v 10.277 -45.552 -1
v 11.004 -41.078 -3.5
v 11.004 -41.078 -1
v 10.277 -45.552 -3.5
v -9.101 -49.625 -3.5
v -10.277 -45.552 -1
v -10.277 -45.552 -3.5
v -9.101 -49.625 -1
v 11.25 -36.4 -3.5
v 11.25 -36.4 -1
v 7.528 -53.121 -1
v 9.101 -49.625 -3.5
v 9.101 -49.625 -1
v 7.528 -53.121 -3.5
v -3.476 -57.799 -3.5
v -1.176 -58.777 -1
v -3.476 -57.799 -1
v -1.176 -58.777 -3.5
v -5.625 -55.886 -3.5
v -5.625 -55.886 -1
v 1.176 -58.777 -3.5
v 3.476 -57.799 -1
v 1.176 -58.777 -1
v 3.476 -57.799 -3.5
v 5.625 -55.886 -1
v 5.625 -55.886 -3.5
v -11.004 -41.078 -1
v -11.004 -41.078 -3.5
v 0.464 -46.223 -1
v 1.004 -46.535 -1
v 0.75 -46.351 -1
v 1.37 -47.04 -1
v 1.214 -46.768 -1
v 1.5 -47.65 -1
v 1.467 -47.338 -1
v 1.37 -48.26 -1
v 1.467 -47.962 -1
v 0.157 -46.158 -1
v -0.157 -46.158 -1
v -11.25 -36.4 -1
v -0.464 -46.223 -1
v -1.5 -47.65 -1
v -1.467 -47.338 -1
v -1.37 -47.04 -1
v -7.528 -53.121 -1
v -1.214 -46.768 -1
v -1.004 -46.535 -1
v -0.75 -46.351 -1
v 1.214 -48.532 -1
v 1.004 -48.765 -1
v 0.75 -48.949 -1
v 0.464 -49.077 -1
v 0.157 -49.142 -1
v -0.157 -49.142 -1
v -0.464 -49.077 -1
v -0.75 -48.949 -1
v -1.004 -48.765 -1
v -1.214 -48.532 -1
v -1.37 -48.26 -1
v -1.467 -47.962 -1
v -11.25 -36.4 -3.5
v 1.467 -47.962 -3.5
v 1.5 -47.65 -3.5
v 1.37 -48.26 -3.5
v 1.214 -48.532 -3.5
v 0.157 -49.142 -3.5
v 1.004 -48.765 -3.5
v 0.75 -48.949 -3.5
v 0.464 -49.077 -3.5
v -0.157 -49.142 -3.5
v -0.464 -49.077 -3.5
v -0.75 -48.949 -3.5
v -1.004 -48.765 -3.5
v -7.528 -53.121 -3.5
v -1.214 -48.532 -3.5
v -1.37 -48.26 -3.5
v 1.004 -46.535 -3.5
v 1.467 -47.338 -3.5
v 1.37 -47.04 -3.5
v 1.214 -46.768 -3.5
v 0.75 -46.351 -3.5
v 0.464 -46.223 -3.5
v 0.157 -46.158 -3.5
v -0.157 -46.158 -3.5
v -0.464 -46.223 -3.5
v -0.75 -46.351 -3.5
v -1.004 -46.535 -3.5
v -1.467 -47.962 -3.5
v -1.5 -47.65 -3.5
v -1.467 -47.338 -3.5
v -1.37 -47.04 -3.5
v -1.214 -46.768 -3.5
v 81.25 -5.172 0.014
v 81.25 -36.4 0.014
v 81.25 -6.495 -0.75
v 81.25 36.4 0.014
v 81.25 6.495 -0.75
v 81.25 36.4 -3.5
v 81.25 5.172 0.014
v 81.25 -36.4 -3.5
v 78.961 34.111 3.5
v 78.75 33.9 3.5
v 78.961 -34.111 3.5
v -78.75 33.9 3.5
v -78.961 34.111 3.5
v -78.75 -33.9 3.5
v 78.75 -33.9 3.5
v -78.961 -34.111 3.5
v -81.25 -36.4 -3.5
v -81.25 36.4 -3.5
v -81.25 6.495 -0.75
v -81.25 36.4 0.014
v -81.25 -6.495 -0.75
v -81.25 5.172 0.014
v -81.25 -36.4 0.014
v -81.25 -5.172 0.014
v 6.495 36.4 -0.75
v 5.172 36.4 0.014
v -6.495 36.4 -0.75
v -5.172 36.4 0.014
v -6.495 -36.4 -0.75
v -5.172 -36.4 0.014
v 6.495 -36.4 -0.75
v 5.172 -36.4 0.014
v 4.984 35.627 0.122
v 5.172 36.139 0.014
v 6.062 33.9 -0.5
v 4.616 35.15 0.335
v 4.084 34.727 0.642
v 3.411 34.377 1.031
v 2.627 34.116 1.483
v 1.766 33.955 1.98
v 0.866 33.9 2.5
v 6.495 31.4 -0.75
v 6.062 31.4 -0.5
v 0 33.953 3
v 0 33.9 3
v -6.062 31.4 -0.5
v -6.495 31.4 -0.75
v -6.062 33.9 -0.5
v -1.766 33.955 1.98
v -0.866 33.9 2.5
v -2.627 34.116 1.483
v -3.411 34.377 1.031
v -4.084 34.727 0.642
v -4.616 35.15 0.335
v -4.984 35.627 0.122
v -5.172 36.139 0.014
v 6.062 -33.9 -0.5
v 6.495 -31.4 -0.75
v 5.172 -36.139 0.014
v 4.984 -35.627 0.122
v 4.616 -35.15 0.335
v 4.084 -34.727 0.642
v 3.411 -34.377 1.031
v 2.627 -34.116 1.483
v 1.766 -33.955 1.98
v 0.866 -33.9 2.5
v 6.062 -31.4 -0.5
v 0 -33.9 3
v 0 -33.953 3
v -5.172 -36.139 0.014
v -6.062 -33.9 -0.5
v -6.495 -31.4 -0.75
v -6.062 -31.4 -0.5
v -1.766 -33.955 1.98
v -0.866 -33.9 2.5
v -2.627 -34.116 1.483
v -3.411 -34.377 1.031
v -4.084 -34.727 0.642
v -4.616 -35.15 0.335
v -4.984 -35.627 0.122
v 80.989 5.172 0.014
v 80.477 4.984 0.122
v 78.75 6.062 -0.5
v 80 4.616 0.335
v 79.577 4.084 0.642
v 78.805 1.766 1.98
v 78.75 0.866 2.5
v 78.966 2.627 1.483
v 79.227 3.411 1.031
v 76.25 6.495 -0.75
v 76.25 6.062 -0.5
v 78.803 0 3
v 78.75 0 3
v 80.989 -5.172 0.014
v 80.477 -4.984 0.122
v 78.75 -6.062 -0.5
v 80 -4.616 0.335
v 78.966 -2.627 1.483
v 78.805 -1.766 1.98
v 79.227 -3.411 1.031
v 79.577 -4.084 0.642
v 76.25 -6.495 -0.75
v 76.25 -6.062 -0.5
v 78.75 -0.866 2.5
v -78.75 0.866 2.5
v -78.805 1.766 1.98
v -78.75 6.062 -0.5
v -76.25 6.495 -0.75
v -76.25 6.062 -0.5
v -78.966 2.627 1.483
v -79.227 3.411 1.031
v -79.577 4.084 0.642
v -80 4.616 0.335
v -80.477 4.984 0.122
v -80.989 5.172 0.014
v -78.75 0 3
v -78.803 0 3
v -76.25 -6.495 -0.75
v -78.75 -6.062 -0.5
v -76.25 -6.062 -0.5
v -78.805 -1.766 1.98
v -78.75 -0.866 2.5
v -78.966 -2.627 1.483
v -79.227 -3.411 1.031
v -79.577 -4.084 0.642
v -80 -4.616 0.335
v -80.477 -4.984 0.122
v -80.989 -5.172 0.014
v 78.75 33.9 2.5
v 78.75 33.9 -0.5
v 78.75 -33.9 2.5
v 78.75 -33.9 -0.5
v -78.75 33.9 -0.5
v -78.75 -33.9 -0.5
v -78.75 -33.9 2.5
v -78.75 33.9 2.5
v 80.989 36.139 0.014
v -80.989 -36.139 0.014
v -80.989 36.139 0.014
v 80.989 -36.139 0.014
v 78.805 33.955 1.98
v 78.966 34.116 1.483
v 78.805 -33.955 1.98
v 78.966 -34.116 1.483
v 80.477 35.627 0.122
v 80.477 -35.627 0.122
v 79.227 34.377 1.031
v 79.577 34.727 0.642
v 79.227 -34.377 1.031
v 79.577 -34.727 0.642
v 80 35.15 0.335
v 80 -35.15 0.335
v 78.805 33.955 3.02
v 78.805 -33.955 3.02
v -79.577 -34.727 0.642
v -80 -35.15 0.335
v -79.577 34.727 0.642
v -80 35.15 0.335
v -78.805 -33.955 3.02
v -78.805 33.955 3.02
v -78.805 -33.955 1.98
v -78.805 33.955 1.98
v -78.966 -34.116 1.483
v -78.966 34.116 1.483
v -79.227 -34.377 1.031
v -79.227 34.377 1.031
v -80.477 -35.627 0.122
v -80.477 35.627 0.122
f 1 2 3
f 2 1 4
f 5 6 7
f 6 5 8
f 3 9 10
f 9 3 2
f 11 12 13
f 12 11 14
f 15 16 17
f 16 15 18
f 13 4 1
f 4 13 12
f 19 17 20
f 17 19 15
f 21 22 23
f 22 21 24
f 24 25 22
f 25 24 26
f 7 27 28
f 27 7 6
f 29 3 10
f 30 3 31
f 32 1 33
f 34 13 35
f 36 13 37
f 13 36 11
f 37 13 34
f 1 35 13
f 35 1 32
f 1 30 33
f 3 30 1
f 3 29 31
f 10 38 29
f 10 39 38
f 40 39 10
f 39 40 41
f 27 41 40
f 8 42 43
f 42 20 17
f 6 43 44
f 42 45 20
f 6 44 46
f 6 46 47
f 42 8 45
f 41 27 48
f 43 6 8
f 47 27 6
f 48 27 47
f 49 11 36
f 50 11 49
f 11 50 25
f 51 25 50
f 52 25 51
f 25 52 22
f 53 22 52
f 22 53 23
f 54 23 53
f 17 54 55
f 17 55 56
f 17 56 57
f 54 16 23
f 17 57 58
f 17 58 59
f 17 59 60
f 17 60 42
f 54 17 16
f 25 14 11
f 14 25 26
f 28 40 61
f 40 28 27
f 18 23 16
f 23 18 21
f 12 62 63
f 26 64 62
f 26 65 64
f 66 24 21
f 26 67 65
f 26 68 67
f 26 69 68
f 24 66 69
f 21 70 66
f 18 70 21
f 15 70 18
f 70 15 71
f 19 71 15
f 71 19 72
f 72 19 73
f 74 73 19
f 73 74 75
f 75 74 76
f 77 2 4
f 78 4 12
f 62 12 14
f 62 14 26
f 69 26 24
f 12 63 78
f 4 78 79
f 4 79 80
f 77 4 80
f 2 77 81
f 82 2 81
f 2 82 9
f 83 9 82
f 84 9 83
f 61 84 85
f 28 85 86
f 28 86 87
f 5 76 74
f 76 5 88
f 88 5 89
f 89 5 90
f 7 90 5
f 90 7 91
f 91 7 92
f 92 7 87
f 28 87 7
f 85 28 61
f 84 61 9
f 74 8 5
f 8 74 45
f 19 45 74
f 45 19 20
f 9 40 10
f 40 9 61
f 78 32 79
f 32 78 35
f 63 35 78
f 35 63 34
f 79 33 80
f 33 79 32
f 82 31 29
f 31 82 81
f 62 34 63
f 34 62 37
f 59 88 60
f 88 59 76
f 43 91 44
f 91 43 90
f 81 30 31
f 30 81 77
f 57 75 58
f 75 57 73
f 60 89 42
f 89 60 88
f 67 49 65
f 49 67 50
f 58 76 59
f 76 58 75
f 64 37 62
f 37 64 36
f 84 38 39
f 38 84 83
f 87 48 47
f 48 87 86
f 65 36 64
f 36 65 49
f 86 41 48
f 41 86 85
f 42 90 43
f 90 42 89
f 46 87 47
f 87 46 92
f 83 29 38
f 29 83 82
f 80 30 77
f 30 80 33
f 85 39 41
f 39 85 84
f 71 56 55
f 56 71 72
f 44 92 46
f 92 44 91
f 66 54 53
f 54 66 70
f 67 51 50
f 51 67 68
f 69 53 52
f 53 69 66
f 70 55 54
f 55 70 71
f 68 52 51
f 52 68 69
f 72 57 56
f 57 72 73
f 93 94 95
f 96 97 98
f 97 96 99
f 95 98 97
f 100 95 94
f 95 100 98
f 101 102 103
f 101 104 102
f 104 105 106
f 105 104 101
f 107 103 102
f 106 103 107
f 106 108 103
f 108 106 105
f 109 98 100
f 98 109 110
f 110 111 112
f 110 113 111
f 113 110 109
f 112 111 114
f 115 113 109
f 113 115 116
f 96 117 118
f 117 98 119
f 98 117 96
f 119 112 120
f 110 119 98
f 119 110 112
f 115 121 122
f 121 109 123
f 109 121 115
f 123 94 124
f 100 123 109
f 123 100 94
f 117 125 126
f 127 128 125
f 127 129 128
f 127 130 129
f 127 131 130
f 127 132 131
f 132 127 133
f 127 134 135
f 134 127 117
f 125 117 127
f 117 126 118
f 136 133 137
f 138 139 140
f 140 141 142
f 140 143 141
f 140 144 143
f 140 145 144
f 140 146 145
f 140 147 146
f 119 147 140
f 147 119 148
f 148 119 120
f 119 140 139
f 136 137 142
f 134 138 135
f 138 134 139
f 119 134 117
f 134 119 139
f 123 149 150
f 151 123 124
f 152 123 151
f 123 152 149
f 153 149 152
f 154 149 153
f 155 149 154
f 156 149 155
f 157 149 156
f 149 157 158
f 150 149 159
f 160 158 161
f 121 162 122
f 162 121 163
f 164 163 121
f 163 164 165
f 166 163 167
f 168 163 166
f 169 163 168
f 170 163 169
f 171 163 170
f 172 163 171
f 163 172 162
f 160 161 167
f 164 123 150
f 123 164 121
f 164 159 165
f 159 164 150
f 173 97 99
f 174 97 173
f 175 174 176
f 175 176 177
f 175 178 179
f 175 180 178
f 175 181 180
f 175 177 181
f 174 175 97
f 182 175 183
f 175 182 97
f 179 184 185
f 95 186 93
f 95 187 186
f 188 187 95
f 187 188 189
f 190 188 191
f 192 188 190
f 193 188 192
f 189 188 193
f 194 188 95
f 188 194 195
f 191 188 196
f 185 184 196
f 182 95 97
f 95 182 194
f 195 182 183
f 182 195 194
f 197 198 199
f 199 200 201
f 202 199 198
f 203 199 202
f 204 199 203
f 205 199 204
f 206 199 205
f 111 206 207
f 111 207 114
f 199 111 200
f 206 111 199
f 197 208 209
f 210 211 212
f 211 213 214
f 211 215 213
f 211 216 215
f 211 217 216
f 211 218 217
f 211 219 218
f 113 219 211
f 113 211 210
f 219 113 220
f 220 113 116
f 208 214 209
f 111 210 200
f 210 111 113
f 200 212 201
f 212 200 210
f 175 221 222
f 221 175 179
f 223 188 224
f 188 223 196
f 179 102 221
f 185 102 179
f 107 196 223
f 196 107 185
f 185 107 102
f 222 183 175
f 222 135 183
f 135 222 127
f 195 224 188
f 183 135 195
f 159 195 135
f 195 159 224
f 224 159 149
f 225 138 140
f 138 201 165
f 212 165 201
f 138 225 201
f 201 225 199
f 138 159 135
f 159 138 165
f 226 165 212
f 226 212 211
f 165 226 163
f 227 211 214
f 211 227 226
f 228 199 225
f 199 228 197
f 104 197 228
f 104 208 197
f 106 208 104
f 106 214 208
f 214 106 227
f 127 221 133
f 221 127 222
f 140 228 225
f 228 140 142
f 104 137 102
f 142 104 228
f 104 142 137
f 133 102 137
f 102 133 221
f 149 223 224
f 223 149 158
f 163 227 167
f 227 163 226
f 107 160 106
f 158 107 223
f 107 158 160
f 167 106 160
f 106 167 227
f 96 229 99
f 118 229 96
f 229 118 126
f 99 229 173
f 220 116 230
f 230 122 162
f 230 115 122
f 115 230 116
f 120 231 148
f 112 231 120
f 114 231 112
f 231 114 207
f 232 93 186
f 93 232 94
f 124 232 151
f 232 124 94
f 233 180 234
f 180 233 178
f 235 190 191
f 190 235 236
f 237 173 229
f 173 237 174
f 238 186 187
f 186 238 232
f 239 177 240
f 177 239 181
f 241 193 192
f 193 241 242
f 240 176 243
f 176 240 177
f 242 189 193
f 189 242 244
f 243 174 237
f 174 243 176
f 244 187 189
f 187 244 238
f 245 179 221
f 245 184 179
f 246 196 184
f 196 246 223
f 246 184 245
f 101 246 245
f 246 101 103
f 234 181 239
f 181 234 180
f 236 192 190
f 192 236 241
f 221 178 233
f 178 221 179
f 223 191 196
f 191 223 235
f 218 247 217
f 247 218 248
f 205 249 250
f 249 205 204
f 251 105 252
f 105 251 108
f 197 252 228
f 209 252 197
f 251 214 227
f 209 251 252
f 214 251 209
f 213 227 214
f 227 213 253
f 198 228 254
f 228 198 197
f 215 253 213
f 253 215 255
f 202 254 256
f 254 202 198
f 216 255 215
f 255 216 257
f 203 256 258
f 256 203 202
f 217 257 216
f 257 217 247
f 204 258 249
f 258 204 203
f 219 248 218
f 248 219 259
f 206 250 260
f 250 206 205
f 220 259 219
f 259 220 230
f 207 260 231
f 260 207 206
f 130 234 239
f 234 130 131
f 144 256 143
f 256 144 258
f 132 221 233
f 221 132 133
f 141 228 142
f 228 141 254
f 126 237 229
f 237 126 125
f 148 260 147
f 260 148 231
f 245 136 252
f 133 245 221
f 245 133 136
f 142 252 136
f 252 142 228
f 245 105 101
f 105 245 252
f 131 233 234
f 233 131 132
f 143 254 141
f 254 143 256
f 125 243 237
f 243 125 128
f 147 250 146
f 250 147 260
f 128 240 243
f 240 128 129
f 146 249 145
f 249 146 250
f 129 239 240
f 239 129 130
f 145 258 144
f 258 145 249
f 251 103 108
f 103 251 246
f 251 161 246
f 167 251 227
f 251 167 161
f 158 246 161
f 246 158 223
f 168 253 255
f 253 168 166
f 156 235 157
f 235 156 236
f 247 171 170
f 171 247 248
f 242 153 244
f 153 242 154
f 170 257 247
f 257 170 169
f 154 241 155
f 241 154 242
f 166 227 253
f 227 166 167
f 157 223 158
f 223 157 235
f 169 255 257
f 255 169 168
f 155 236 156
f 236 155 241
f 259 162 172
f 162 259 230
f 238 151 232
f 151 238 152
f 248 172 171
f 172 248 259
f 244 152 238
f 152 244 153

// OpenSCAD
//------------------Variables------------------\\ 

		//----Global Values----\\
			//The default unit in OpenSCAD is mm and this unit variable allows one to change the variables in the code with units other than mm. Default is 1, for mm, but cm is 10 and inches is 25.4. Note that this entails that you change EVERY variable (except maybe sfn)  so that one piece of the model is not ridiculously bigger/smaller than the other parts. 
				unit=1;

			//The detail in the cylinders/spheres of the shape.
				sfn=30;

		//----Bill Specifics----\\

			//The length of the bill.
				billength= 157.5;

			//The width of the bill. 
				billwidth = 67.8;

			//The thickness of the frame. 
				framethick = 5;
			
			//Bottom Thickness
				botthick = 2 ;

		//----Frame Specifics----\\

			//The border of the frame length-wise. This is the measurement from the inside of the frame to the outisde on the length (x) axis. The cylinders that shape the frame use this measurement.
				xframe = 5;

			//The border of the frame width-wise. This is the measurement from the inside of the frame to the outisde on the width (y) axis.
				yframe = 5;
		
			//How prominent the frame shaping is. Play with this value. Default is 2.
				frameshapethick = 1;

			//How raised the frame shaping is. Play with this value as well. 
				frameshaperaise = 0;
		
	//----Paper clip slit size----\\\
		//Width of the paperclip slit. Adjust this value if as you want. 
		slitwidth = 10;
		
		//Height of the slit. This is actually a size control but it mainly changes the size.
		slitheight = 10;

		//Where the slit is. Slit is in the middle by default but depending on size you may have to raise or lower this value.
		slitlift =-1.5;

		//Shape of slit in sides. Default is 3 (triangle) as its overhangs are not unbearable.
		slitshape=3;

		//Slit scale (x,y,z)
		slitscalex= 0.5;
		slitscaley= 1.5;
		slitscalez= 1;
	
	//----Hook sizing----\\
		//Hook size
		hooksize=22.5;

		//Hook hole size
		hookhole=3;

		//Hook thickness
		hookthick=2.5;

//-------------------Modules-------------------\\ 

	//----Basic Frame Shapes----\\
		module bill() {
			cube([billength*unit, billwidth*unit,framethick*unit], center=true);
		}

		module outsideframe() { 
			cube([(billength+xframe)*unit, (billwidth+yframe)*unit, (framethick+botthick)*unit], center=true);
		}

	//----Frame shaping.----\\
		//Frame shaping cylinder on the X Axis.
			module xfsc() {
				cylinder(r=(framethick*unit)/(frameshapethick*2), h=(billwidth+yframe)*unit+xframe, center=true, $fn=sfn);
			}

		//Frame shaping cylinder on the Y Axis.
			module yfsc() {
				cylinder(r=(framethick*unit)/(frameshapethick*2), h=(billength+xframe)*unit+yframe, center=true, $fn=sfn);
			}

		//Frameshaping general module
			module frameshaping() {
				translate([(billength/2)*unit+xframe/2, 0, (framethick/2)*unit]) {
					rotate([90,0,0]) {
						xfsc();
					}
				}
				translate([(-billength/2)*unit-xframe/2, 0, (framethick/2)*unit]) {
					rotate([90,0,0]) {
						xfsc();
					}
				}

				translate([0, (billwidth/2)*unit+yframe/2, (framethick/2)*unit]) {
					rotate([90,0,90]) {
						yfsc();
					}
				}
				translate([0, (-billwidth/2)*unit-yframe/2, (framethick/2)*unit]) {
					rotate([90,0,90]) {
						yfsc();
					}
				}
			}

	



	//A slit on every side for a paper clip to hold it down
	module clipslit() {
		translate([0, ((billwidth+yframe)/2)*unit, slitlift*unit]) {
			rotate([0,270,90]) {
				scale([slitscalex,slitscaley,slitscalez]) {
					cylinder(r=(slitheight/2)*unit, h=slitwidth*unit, $fn=slitshape, center=true);
				}
			}
		}
		translate([0, ((billwidth+yframe)/2)*-unit, slitlift*unit]) {
			rotate([0,270,90]) {
				scale([slitscalex,slitscaley,slitscalez]) {
					cylinder(r=(slitheight/2)*unit, h=slitwidth*unit, $fn=slitshape, center=true);
				}
			}
		}
		translate([((billength+xframe)/2)*unit, 0, slitlift*unit]) {
			rotate([0,270,0]) {
				scale([slitscalex,slitscaley,slitscalez]) {
					cylinder(r=(slitheight/2)*unit, h=slitwidth*unit, $fn=slitshape, center=true);
				}
			}
		}
		translate([-unit*((billength+xframe)/2), 0, slitlift*unit]) {
			rotate([0,270,0]) {
				scale([slitscalex,slitscaley,slitscalez]) {
					cylinder(r=(slitheight/2)*unit, h=slitwidth*unit, $fn=slitshape, center=true);
				}
			}
		}				
	}

		
	module hook() {
		translate([0,-((billwidth+xframe)/2)*unit, (-(framethick+botthick)/2)*unit ]) {
			difference() {
				scale([1,2,1]) {
					cylinder(r=(hooksize/2)*unit, h=hookthick*unit, $fn=sfn);
				}
				translate([(-hooksize/2)*unit, 0]) {
					cube([hooksize*unit, hooksize*unit, hookthick*unit]);
				}
				translate([0, (-hooksize/2)*unit, 0]) {
					cylinder(r=(hookhole/2)*unit, h=hookthick*unit, $fn=sfn);
				}
			}
		}
	}


	//Plating module
	module frame() {
		difference() {
			union(){
				outsideframe();
				hook();
			}
			translate([0,0, botthick]) {
				bill();
				clipslit();
			}
			translate([0,0, frameshaperaise]) {
				frameshaping();
			}
		}
	}

frame();
